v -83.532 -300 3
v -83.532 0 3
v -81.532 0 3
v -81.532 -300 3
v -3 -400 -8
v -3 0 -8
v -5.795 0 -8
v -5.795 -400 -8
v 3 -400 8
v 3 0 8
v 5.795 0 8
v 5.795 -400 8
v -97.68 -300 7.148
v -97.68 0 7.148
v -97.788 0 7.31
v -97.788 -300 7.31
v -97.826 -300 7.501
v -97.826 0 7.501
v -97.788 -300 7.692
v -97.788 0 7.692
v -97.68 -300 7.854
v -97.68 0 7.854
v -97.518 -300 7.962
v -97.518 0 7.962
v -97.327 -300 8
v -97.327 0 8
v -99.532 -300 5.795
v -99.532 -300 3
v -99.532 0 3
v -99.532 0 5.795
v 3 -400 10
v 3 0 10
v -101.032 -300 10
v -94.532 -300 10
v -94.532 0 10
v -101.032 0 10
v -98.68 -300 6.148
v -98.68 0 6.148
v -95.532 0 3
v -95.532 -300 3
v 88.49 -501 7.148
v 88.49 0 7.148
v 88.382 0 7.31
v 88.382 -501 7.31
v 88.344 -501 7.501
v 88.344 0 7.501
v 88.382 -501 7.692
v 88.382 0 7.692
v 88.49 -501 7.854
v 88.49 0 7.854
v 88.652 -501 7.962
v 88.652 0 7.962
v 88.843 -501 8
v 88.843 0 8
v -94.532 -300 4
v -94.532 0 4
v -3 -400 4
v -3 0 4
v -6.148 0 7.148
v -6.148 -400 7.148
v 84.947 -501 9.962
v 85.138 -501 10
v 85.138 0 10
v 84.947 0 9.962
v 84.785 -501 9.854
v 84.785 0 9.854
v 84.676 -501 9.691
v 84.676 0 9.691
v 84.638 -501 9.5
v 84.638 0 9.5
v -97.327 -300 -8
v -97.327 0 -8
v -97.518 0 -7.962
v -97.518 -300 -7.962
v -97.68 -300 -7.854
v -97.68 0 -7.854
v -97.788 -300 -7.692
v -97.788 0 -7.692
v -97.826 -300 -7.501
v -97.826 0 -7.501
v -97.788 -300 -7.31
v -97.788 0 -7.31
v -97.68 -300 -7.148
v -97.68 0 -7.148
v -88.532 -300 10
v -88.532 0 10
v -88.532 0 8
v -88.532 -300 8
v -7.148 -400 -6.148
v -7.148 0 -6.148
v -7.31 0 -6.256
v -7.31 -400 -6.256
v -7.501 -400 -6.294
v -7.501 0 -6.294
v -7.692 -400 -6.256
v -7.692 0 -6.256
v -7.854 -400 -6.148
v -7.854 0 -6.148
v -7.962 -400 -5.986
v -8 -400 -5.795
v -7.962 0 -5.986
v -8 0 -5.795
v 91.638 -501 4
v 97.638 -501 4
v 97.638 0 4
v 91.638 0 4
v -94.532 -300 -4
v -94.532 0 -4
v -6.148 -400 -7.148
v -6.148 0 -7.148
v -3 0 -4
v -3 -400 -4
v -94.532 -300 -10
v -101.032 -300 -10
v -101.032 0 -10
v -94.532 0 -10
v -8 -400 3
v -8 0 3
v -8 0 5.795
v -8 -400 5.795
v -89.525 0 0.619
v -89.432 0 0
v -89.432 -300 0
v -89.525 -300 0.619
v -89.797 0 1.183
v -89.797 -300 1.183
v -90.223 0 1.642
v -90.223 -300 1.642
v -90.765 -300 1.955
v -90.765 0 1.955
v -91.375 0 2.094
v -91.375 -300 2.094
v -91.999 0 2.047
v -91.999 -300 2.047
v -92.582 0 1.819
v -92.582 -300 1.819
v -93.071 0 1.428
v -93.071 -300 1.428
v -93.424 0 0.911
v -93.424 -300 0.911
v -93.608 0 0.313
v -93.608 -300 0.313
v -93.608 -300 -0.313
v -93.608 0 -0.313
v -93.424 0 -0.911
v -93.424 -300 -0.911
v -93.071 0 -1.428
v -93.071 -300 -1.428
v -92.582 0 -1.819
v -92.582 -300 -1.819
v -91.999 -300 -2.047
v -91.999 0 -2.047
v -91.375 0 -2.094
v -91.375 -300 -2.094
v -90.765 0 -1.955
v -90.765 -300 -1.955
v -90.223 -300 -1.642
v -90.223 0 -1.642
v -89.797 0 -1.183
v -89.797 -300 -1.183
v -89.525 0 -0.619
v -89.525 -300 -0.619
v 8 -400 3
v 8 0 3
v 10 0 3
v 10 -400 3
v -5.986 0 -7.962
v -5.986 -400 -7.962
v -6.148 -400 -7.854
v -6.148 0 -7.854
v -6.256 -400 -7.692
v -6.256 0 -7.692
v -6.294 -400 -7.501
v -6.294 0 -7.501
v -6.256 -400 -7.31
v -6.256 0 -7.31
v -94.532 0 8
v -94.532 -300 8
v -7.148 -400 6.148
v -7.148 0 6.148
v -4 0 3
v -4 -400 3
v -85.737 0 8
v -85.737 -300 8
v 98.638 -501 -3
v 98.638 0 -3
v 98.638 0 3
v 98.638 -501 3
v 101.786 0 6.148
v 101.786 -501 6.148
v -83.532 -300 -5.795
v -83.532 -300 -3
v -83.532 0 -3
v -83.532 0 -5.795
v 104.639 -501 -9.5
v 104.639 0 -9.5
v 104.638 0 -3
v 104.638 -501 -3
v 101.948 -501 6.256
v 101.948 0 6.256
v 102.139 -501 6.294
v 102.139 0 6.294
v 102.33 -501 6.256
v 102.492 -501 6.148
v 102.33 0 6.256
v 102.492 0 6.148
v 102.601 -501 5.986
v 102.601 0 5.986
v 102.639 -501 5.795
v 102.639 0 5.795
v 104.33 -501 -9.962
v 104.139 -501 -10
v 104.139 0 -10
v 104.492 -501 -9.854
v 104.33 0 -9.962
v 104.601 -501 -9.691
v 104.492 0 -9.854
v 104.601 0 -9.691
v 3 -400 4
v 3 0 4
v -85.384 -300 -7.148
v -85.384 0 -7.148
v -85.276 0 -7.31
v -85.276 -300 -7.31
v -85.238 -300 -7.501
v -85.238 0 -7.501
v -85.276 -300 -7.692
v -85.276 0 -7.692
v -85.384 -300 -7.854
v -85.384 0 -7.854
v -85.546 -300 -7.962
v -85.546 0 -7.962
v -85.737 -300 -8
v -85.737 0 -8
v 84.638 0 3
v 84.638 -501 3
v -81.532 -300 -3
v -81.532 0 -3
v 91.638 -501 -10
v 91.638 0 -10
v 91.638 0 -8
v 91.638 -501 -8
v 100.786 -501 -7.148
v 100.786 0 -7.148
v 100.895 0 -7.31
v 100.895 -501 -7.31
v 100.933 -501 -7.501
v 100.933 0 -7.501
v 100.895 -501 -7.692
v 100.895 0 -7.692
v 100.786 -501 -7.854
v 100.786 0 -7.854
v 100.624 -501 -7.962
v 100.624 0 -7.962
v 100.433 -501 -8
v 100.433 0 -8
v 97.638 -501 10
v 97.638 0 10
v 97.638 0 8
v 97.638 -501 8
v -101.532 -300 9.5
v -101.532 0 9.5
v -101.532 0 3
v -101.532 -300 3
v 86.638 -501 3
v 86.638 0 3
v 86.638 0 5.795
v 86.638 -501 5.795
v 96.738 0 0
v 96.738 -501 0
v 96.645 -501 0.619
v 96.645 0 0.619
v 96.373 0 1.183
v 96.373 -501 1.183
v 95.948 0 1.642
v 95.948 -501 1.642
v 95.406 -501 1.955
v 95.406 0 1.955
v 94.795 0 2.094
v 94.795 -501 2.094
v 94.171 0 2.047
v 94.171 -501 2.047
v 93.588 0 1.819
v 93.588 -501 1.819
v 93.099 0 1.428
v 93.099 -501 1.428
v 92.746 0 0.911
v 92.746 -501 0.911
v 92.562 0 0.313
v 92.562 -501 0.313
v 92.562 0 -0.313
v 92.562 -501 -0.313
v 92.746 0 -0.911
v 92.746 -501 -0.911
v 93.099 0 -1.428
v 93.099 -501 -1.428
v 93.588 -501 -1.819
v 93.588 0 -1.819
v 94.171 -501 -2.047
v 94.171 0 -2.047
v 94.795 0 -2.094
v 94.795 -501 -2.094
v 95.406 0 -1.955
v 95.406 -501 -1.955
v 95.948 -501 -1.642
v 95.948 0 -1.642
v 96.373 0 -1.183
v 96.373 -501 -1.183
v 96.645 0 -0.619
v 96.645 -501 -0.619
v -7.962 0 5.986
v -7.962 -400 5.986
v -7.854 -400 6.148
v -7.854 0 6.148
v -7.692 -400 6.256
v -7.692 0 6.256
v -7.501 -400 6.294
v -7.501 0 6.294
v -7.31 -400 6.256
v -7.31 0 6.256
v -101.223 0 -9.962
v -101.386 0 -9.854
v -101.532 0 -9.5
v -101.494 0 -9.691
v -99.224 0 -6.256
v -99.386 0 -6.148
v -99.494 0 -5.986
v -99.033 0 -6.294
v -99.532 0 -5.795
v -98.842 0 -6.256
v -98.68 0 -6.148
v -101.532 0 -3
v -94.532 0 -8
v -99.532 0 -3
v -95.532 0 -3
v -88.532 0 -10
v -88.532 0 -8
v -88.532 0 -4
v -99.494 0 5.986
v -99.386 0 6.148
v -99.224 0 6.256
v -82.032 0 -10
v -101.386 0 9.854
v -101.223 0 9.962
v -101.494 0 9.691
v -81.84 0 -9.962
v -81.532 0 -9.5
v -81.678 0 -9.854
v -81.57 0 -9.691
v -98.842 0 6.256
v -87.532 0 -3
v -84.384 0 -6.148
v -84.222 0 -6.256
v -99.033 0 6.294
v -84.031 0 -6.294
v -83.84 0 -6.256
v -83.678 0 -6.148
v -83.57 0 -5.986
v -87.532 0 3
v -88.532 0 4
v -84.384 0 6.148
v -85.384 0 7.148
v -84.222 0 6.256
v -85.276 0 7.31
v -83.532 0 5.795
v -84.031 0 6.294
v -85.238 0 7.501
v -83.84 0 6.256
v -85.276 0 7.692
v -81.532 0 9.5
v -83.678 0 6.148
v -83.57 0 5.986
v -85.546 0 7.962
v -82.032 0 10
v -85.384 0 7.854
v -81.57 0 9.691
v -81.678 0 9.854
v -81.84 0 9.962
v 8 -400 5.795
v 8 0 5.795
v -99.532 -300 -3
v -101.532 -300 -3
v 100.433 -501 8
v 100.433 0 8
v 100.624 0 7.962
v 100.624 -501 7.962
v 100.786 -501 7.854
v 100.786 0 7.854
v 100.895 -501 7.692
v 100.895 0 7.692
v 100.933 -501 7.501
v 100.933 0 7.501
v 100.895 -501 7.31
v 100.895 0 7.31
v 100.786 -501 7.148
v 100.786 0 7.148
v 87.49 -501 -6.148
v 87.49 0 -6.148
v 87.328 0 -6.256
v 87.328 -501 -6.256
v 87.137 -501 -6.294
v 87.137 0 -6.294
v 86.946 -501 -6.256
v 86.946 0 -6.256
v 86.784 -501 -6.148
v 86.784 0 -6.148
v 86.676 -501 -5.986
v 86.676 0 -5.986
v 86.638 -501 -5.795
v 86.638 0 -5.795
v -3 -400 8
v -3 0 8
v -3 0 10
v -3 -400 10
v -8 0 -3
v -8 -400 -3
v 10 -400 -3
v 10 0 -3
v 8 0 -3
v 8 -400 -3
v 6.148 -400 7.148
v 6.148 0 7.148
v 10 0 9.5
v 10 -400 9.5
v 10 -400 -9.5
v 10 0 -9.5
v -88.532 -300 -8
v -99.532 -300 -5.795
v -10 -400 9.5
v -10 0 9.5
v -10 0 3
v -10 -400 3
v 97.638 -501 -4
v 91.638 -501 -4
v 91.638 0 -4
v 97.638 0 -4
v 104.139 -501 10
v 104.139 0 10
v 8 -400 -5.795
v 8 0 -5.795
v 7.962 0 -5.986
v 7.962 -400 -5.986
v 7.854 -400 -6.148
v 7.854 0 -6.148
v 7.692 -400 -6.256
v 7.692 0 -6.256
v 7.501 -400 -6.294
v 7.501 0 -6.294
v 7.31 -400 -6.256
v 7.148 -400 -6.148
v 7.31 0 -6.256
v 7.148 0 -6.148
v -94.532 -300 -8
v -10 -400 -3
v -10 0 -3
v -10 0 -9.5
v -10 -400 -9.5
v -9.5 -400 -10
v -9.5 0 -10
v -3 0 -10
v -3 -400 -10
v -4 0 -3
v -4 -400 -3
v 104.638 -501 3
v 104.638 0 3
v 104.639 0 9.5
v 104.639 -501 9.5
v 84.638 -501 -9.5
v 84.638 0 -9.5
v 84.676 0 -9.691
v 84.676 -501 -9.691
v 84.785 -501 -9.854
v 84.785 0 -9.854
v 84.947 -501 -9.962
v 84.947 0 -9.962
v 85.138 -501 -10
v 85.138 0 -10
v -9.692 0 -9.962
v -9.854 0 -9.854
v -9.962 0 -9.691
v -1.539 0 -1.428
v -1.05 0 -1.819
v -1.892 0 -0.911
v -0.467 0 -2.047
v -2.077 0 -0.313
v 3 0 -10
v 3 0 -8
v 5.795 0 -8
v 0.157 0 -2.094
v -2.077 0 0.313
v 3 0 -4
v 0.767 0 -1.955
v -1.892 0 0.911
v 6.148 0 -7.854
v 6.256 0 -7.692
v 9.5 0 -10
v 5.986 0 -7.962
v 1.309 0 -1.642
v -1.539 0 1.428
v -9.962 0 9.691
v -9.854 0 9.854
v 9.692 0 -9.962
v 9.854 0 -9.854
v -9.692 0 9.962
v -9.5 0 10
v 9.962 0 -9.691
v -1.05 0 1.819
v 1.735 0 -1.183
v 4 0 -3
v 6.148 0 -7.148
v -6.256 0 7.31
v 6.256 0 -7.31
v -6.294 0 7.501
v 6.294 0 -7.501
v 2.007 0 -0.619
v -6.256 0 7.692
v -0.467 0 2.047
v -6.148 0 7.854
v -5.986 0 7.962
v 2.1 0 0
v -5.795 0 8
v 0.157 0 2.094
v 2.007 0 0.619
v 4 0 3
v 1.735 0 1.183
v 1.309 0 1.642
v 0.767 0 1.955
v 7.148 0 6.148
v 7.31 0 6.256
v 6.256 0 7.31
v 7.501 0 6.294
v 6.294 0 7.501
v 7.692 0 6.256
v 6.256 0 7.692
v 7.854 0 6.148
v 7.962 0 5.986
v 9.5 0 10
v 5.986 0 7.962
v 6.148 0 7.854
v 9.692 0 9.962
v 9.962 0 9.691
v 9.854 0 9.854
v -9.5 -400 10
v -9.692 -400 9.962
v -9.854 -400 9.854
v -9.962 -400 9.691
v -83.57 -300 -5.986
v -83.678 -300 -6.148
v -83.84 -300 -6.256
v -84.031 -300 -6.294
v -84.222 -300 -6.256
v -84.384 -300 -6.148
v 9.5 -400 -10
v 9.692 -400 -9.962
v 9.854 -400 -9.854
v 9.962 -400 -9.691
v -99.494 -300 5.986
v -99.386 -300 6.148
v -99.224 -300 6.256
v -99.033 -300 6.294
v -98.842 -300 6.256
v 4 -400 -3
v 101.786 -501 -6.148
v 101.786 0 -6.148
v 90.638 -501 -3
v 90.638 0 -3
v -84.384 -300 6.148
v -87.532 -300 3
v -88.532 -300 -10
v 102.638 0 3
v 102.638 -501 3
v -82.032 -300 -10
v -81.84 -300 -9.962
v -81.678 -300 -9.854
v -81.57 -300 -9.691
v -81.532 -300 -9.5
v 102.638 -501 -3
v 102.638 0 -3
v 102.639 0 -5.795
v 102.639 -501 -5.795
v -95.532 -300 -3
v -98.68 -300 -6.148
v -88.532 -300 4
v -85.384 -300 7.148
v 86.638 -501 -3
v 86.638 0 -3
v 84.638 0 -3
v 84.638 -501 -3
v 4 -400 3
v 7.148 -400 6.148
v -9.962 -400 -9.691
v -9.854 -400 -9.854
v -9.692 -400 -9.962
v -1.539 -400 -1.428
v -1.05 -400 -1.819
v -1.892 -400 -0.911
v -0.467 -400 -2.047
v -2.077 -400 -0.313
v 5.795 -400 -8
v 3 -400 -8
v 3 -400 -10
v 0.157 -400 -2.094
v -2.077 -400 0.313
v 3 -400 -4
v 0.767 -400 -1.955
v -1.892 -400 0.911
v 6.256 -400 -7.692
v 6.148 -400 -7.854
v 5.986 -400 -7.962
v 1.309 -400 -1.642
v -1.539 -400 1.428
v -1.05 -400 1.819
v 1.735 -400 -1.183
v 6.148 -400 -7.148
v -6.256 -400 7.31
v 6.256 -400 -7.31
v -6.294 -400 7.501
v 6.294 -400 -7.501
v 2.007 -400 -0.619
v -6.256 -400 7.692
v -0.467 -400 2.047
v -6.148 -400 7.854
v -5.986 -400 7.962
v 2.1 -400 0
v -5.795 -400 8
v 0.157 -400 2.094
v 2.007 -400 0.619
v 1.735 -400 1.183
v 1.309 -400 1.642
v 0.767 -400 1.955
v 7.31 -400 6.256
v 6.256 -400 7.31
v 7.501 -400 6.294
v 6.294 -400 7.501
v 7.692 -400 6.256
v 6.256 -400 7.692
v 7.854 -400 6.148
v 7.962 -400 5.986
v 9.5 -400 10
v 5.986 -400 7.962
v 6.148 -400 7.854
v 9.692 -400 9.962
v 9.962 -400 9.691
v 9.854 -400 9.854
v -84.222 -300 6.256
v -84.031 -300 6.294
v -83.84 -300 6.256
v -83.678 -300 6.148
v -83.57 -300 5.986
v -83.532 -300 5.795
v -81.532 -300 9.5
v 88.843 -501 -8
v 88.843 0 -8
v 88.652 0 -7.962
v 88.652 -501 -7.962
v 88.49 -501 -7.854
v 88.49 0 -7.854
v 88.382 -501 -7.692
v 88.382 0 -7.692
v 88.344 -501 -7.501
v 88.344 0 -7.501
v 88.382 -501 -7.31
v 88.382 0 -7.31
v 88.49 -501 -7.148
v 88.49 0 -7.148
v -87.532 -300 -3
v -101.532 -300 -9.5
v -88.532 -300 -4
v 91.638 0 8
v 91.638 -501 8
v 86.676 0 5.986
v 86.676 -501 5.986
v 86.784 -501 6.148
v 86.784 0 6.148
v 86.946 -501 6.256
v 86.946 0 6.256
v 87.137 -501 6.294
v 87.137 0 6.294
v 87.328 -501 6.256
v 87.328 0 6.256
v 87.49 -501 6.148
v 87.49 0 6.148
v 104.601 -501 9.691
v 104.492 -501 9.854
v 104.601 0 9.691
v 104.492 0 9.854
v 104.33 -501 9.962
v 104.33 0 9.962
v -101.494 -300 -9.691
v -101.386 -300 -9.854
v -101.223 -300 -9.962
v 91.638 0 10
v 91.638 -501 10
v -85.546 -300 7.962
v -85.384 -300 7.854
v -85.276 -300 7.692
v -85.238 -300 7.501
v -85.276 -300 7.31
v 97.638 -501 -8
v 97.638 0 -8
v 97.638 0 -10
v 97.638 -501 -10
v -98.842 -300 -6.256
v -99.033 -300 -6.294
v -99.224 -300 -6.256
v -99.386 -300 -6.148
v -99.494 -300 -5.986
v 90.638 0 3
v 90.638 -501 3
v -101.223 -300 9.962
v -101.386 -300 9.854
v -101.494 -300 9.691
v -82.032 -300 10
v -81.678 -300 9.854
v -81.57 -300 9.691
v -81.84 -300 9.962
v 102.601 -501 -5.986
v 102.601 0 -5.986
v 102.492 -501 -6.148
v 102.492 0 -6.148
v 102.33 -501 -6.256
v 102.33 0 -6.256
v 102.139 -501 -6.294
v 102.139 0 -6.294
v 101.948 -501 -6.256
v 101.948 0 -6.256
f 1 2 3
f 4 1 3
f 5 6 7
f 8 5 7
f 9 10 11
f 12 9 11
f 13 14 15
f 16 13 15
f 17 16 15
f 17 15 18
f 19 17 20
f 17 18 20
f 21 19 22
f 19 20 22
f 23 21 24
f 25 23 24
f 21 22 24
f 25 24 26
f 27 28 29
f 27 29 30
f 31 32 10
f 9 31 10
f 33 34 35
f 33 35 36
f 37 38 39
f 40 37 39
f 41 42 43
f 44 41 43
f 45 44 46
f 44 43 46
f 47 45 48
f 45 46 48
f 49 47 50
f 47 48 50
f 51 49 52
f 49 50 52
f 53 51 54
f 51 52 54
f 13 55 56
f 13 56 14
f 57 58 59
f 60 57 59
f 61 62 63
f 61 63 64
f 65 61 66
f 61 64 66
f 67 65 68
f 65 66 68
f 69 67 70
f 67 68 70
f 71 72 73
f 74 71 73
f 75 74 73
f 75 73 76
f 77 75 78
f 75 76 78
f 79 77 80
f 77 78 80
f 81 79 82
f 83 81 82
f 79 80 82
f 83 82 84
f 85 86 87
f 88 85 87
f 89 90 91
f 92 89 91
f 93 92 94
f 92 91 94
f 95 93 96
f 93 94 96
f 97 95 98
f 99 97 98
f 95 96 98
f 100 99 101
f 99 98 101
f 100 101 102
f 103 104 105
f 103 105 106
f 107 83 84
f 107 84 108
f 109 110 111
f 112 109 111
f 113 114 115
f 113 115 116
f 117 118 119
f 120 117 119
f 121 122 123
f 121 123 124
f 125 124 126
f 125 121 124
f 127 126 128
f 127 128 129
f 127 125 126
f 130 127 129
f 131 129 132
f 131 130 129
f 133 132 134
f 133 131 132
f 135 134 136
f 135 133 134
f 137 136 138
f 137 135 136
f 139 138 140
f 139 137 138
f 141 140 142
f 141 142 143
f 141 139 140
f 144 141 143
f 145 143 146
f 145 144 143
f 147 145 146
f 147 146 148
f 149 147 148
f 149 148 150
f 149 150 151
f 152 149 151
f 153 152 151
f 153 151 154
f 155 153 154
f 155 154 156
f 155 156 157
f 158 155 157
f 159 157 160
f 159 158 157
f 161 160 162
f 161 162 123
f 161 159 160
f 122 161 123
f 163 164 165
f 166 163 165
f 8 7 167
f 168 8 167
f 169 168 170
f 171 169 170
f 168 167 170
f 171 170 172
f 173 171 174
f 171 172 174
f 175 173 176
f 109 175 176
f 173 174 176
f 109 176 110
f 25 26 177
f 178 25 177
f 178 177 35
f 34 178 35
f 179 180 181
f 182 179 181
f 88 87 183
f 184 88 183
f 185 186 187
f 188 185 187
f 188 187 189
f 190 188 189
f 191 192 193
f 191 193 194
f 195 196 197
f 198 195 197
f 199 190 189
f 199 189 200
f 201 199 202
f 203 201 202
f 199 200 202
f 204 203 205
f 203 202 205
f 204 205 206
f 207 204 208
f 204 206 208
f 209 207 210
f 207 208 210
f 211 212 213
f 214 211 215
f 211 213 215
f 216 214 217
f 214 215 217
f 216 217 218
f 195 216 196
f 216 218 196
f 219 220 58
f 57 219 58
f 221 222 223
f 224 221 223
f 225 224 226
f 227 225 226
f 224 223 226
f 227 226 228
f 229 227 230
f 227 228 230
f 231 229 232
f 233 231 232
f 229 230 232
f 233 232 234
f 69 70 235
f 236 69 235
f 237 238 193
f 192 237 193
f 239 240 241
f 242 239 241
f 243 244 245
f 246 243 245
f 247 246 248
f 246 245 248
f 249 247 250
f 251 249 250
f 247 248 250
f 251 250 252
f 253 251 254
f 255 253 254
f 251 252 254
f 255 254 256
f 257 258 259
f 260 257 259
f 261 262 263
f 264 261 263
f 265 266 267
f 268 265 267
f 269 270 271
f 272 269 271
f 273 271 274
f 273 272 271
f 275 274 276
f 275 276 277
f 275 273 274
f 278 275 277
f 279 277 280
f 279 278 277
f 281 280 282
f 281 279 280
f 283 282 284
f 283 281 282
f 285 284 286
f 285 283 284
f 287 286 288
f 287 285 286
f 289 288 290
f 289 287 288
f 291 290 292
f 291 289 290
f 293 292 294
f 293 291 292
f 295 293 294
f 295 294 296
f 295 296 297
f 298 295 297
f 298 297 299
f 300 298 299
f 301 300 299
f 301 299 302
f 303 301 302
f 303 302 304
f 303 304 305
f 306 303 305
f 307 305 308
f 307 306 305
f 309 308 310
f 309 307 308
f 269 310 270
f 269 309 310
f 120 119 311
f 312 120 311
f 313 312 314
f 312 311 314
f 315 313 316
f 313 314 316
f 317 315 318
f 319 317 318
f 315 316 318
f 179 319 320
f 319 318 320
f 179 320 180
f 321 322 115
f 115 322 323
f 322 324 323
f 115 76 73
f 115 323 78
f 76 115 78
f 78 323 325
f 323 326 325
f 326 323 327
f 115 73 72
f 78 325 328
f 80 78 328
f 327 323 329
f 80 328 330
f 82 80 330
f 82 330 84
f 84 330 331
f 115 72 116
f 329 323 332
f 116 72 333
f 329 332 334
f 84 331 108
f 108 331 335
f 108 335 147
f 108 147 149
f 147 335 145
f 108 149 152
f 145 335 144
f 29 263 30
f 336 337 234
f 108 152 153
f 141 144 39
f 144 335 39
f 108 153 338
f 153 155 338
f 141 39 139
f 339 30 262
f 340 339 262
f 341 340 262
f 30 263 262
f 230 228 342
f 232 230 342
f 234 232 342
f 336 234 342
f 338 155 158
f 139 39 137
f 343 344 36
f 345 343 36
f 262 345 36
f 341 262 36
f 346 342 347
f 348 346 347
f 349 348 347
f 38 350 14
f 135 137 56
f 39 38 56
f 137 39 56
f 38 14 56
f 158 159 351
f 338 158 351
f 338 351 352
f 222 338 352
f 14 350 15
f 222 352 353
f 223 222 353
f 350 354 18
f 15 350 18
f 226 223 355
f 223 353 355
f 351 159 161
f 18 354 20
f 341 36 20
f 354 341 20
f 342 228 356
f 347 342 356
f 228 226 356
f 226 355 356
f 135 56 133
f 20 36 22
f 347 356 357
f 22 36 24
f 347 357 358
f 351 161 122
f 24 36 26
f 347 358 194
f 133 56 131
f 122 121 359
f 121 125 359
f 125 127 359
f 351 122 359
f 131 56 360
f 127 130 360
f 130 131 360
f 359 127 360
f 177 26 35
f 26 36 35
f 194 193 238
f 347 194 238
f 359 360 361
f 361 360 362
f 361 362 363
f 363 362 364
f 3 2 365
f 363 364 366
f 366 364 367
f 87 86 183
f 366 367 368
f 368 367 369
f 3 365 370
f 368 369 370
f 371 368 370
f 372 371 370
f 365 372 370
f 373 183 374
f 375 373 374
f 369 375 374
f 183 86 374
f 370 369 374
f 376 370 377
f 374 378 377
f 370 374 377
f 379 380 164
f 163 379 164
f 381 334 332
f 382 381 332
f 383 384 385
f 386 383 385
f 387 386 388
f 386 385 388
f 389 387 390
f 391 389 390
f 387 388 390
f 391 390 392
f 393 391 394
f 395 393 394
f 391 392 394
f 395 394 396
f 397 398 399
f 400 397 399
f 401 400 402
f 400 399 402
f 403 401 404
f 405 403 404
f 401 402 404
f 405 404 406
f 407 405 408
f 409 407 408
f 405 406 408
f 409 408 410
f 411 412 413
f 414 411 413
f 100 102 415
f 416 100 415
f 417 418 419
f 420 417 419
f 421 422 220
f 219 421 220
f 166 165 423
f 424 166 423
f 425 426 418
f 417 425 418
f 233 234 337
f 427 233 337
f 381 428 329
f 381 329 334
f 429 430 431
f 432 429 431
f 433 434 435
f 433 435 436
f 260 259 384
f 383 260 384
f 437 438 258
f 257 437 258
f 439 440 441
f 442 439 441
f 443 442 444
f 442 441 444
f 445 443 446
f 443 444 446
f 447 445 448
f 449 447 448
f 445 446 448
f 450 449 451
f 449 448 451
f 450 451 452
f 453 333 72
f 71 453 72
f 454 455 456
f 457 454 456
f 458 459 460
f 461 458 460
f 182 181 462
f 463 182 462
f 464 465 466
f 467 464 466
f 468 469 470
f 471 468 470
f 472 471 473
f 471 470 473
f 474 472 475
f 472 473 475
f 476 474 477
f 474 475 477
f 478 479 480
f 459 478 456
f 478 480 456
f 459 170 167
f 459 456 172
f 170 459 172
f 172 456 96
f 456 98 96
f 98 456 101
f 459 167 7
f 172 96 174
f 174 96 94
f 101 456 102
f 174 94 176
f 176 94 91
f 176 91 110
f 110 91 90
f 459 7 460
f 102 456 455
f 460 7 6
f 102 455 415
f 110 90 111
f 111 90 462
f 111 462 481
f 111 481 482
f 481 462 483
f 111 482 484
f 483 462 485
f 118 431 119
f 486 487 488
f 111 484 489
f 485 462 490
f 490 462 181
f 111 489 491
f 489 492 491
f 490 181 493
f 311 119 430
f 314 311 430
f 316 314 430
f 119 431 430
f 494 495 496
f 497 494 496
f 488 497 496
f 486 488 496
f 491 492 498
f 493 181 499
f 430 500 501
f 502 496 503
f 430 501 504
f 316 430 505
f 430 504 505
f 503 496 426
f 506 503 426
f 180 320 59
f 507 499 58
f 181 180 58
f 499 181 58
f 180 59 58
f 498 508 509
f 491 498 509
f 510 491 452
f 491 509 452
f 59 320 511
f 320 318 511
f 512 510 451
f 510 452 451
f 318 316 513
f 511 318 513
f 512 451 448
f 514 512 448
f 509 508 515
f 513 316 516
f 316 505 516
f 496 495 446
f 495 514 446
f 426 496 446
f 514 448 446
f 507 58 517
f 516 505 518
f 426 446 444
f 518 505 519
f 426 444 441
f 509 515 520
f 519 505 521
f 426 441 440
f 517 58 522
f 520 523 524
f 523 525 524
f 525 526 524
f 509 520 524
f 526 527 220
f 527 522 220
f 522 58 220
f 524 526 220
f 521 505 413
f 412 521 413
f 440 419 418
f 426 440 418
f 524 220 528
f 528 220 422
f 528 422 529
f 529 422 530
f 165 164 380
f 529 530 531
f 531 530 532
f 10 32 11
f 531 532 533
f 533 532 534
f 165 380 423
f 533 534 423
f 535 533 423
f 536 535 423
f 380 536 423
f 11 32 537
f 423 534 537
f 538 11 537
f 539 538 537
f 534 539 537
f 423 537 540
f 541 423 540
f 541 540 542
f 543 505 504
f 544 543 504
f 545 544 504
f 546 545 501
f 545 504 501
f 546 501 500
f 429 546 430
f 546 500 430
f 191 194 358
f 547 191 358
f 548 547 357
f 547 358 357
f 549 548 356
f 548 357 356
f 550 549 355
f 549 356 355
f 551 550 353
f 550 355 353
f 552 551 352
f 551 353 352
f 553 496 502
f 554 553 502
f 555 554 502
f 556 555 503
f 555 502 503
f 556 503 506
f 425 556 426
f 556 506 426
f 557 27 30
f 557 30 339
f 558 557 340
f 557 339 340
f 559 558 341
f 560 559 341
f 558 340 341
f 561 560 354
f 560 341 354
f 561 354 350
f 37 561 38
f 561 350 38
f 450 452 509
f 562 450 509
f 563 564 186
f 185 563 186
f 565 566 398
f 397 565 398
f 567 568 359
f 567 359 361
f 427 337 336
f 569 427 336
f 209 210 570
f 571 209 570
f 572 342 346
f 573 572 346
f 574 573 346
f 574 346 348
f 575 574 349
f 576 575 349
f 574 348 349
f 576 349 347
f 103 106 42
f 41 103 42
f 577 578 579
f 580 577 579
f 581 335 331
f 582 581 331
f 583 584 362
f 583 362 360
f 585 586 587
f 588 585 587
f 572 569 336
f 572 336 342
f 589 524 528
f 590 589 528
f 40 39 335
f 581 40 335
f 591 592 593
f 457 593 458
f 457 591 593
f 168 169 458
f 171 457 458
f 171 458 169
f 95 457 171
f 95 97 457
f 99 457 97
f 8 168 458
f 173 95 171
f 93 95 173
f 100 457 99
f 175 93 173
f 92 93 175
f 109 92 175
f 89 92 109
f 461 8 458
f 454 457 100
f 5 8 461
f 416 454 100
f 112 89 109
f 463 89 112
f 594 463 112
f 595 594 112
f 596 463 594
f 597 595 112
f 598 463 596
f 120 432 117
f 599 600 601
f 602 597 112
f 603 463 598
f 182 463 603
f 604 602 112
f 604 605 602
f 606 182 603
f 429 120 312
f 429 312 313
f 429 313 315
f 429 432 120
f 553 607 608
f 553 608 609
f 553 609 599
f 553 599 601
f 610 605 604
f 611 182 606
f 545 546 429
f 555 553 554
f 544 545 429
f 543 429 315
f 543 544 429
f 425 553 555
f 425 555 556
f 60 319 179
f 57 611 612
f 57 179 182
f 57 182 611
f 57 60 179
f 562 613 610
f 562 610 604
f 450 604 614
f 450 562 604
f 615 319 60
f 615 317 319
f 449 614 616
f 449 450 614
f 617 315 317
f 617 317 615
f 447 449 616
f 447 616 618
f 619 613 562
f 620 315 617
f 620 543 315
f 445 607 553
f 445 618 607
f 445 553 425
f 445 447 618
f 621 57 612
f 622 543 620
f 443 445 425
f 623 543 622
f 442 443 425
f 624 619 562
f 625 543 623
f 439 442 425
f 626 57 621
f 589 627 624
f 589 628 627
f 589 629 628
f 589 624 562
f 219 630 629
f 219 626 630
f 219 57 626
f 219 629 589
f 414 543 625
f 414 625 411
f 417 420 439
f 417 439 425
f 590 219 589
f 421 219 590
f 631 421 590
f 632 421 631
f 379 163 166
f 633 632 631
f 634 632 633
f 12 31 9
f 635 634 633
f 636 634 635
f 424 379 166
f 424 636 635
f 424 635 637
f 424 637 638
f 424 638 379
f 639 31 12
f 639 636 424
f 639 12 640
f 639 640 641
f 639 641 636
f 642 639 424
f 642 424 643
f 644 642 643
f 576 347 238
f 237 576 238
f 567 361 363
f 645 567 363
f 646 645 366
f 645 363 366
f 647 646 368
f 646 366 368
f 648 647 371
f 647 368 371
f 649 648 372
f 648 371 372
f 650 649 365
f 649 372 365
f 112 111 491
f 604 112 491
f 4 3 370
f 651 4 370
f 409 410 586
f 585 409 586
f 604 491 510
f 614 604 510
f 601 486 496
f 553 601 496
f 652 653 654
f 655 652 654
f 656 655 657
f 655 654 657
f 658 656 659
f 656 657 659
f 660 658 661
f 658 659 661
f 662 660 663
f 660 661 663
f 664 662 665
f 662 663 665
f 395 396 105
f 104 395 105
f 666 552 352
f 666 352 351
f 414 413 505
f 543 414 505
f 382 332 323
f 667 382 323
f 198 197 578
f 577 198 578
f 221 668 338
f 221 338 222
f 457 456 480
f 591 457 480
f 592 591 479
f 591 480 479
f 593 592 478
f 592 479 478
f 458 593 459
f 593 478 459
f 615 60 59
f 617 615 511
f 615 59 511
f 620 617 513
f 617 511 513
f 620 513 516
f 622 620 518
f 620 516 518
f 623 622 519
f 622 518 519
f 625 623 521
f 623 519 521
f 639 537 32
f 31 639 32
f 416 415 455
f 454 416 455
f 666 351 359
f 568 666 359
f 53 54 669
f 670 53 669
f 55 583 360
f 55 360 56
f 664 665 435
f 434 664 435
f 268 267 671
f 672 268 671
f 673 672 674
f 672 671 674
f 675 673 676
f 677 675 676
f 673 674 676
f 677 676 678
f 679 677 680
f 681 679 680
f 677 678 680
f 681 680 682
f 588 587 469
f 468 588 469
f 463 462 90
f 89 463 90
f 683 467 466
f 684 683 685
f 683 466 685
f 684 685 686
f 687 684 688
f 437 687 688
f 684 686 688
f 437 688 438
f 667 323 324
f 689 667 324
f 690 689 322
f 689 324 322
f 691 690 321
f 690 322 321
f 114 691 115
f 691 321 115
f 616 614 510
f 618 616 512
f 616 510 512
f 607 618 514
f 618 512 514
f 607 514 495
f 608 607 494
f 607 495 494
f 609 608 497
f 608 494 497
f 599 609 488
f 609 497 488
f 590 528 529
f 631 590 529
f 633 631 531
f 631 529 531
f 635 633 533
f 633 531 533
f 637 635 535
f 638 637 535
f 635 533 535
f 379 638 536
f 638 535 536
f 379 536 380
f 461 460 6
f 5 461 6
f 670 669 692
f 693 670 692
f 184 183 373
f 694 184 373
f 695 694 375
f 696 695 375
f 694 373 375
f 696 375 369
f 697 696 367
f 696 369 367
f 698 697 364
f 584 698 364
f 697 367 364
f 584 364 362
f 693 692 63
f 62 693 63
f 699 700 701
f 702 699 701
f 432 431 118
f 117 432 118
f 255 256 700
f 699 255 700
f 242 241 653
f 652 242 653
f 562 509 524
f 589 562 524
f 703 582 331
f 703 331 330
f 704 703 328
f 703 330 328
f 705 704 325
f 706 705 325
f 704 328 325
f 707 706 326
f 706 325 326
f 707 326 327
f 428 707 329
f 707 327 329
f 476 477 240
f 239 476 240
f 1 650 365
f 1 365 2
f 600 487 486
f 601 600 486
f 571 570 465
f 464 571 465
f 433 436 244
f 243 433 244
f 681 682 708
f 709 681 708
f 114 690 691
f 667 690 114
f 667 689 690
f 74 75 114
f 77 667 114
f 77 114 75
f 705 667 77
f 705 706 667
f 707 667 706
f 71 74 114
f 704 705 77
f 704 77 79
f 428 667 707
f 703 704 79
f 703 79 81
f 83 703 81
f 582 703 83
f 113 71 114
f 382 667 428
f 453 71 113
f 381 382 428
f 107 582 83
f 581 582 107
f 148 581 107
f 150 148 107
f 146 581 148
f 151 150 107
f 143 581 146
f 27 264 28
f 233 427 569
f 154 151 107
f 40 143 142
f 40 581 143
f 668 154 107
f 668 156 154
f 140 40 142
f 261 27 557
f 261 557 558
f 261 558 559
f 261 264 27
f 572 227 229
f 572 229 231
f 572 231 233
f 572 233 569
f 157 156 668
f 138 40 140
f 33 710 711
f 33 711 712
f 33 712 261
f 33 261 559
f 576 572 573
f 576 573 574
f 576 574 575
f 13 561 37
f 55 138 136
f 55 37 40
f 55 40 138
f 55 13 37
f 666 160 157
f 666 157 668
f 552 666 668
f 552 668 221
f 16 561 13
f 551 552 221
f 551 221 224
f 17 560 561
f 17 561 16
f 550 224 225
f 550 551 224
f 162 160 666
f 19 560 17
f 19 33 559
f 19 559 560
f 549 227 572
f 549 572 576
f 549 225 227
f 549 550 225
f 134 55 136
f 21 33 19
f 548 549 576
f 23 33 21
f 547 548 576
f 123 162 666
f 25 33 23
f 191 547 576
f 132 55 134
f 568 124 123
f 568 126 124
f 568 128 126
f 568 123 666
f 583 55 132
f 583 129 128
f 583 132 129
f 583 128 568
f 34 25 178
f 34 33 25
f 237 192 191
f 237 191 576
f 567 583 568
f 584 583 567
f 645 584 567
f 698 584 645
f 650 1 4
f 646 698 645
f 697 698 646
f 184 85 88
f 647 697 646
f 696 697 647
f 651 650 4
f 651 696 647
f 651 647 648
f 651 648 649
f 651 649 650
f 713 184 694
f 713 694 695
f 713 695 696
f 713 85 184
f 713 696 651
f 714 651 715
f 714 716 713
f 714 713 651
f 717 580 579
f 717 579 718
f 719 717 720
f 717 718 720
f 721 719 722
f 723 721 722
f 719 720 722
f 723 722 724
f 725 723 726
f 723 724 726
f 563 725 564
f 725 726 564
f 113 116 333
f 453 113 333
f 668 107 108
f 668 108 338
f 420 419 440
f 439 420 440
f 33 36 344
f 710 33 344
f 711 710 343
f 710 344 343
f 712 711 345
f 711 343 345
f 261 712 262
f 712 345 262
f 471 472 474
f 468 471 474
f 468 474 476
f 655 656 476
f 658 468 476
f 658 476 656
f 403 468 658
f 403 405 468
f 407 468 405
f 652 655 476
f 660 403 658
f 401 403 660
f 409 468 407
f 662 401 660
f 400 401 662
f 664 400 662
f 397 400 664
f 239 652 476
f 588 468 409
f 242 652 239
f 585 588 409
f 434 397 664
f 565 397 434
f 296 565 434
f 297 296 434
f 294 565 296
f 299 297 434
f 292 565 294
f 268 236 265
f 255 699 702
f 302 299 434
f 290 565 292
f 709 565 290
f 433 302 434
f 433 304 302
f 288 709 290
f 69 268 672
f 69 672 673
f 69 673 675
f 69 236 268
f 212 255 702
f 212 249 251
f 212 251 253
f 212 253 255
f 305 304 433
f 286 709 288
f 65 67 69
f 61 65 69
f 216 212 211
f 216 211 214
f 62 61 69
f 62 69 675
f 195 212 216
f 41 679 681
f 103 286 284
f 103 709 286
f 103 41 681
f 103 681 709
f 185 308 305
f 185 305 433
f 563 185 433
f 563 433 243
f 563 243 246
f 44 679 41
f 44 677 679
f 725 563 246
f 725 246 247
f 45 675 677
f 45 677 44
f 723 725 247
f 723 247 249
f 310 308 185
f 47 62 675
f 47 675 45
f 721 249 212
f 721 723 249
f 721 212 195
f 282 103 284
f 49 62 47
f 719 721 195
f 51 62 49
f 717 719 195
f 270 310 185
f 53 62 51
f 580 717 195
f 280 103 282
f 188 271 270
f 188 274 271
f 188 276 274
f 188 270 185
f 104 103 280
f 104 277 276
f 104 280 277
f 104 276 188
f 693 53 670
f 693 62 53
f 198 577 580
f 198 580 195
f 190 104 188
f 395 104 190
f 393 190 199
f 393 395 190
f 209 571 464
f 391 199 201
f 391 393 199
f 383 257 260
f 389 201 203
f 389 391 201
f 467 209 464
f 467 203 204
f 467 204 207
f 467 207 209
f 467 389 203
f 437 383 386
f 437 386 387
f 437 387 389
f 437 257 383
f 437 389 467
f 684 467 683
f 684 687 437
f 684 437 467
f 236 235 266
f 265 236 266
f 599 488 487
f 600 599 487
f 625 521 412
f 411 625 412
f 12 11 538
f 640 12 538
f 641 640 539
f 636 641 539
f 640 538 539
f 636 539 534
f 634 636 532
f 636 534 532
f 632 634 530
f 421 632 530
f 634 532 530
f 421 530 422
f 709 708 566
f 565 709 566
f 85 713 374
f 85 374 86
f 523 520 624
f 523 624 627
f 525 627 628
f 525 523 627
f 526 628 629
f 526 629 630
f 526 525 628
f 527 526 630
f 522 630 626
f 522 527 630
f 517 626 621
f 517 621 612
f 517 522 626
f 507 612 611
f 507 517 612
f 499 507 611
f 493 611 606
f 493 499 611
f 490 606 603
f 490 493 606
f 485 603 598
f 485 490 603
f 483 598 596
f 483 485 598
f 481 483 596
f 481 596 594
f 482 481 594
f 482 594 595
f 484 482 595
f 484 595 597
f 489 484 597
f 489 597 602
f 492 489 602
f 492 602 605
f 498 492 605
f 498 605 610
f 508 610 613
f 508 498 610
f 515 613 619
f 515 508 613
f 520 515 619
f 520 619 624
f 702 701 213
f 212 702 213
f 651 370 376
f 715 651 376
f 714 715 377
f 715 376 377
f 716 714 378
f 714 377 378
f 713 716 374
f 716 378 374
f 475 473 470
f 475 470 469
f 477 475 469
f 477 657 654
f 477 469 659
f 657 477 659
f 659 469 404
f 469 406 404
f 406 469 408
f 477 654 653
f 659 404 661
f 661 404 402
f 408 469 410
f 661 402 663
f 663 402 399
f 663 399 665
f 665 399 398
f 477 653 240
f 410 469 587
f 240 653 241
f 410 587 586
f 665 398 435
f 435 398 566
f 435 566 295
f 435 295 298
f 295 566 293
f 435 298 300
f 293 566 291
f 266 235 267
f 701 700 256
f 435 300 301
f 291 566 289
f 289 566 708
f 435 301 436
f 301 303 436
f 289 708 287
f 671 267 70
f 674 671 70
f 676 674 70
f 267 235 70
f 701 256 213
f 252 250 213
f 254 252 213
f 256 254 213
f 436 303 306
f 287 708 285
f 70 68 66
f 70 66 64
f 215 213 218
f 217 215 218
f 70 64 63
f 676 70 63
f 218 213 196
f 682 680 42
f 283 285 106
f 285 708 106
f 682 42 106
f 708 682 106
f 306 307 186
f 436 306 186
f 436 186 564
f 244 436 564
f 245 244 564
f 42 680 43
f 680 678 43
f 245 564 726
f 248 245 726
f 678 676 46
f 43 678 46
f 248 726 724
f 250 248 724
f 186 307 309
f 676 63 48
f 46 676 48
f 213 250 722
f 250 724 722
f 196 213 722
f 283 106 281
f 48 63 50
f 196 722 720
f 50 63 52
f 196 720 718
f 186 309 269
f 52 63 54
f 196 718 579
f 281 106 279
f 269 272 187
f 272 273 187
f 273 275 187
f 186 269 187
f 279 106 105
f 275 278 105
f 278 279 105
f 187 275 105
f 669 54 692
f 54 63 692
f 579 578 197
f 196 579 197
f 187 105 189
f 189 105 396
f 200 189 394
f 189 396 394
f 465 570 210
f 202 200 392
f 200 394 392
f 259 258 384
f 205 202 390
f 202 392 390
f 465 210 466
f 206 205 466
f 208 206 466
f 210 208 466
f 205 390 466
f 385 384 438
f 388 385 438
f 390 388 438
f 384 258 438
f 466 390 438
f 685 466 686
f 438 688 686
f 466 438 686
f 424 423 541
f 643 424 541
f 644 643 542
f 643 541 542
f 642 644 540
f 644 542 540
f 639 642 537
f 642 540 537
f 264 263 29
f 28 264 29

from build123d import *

# Parameters (mm, degrees)
F0_R     = 2.1
F1_DEPTH = 400
F2_DEPTH = 300
F3_DEPTH = 501


# Not quite as in the source:
# - ends of sketch curves that miss each other by under 0.0002 mm in the source are joined


with BuildPart() as f1:
    # F0 (on Front) → F1 (new body)
    with BuildSketch(Plane.XZ):
        with BuildLine():
            Line((-2.9999018588, 10), (-9.5002061197, 10))
            ThreePointArc((-9.5002061197, 10), (-9.8537595103, 9.8535533906), (-10.0002061197, 9.5))
            Line((-10.0002061197, 9.5), (-10.0000650851, 2.9996848913))
            Line((-10.0000650851, 2.9996848913), (-8.0000650797, 2.9997609984))
            Line((-8.0000650797, 2.9997609984), (-8.0001257238, 5.7948624374))
            ThreePointArc((-8.0001257238, 5.7948624374), (-7.6920243598, 6.2559885353), (-7.1480945067, 6.147803307))
            Line((-7.1480945067, 6.147803307), (-4.0000487303, 2.9998477851))
            Line((-4.0000487303, 2.9998477851), (-4.0000487303, -2.9998477851))
            Line((-4.0000487303, -2.9998477851), (-7.1480945067, -6.147803307))
            ThreePointArc((-7.1480945067, -6.147803307), (-7.6920243598, -6.2559885353), (-8.0001257238, -5.7948624374))
            Line((-8.0001257238, -5.7948624374), (-8.0000650797, -2.9997609984))
            Line((-8.0000650797, -2.9997609984), (-10.0000650851, -2.9996848913))
            Line((-10.0000650851, -2.9996848913), (-10.0002061194, -9.4999891517))
            ThreePointArc((-10.0002061194, -9.4999891517), (-9.8537595103, -9.8535533906), (-9.5002061197, -10))
            Line((-9.5002061197, -10), (-2.9999018588, -10))
            Line((-2.9999018588, -10), (-2.9999345728, -7.9999999934))
            Line((-2.9999345728, -7.9999999934), (-5.7950360114, -7.9999999934))
            ThreePointArc((-5.7950360114, -7.9999999934), (-6.2561554244, -7.6918886246), (-6.1479583947, -7.1479611189))
            Line((-6.1479583947, -7.1479611189), (-2.9999345717, -3.9999836431))
            Line((-2.9999345717, -3.9999836431), (2.9999345717, -3.9999836431))
            Line((2.9999345717, -3.9999836431), (6.1479583947, -7.1479611189))
            ThreePointArc((6.1479583947, -7.1479611189), (6.2561554244, -7.6918886246), (5.7950360114, -7.9999999934))
            Line((5.7950360114, -7.9999999934), (2.9999345728, -7.9999999934))
            Line((2.9999345728, -7.9999999934), (2.9999018588, -10))
            Line((2.9999018588, -10), (9.5002061197, -10))
            ThreePointArc((9.5002061197, -10), (9.8537595103, -9.8535533906), (10.0002061197, -9.5))
            Line((10.0002061197, -9.5), (10.0000650851, -2.9996848913))
            Line((10.0000650851, -2.9996848913), (8.0000650797, -2.9997609984))
            Line((8.0000650797, -2.9997609984), (8.0001257238, -5.7948624374))
            ThreePointArc((8.0001257238, -5.7948624374), (7.6920243598, -6.2559885353), (7.1480945067, -6.147803307))
            Line((7.1480945067, -6.147803307), (4.0000487303, -2.9998477851))
            Line((4.0000487303, -2.9998477851), (4.0000487303, 2.9998477851))
            Line((4.0000487303, 2.9998477851), (7.1480945067, 6.147803307))
            ThreePointArc((7.1480945067, 6.147803307), (7.6920243598, 6.2559885353), (8.0001257238, 5.7948624374))
            Line((8.0001257238, 5.7948624374), (8.0000650797, 2.9997609984))
            Line((8.0000650797, 2.9997609984), (10.0000650851, 2.9996848913))
            Line((10.0000650851, 2.9996848913), (10.0002061194, 9.4999891517))
            ThreePointArc((10.0002061194, 9.4999891517), (9.8537595103, 9.8535533906), (9.5002061197, 10))
            Line((9.5002061197, 10), (2.9999018588, 10))
            Line((2.9999018588, 10), (2.9999345728, 7.9999999934))
            Line((2.9999345728, 7.9999999934), (5.7950360114, 7.9999999934))
            ThreePointArc((5.7950360114, 7.9999999934), (6.2561554244, 7.6918886246), (6.1479583947, 7.1479611189))
            Line((6.1479583947, 7.1479611189), (2.9999345717, 3.9999836431))
            Line((2.9999345717, 3.9999836431), (-2.9999345717, 3.9999836431))
            Line((-2.9999345717, 3.9999836431), (-6.1479583947, 7.1479611189))
            ThreePointArc((-6.1479583947, 7.1479611189), (-6.2561554244, 7.6918886246), (-5.7950360114, 7.9999999934))
            Line((-5.7950360114, 7.9999999934), (-2.9999345728, 7.9999999934))
            Line((-2.9999345728, 7.9999999934), (-2.9999018588, 10))
        make_face()
        Circle(F0_R, mode=Mode.SUBTRACT)
    extrude(amount=F1_DEPTH)


with BuildPart() as f2:
    # F0 (on Front) → F2 (new body)
    with BuildSketch(Plane.XZ):
        with BuildLine():
            Line((-83.5317097726, 5.7948624374), (-83.5317704167, 2.9997609984))
            Line((-83.5317704167, 2.9997609984), (-81.5317704113, 2.9996848913))
            Line((-81.5317704113, 2.9996848913), (-81.531629377, 9.4999891517))
            ThreePointArc((-81.531629377, 9.4999891517), (-81.6780759861, 9.8535533906), (-82.0316293767, 10))
            Line((-82.0316293767, 10), (-88.5319336376, 10))
            Line((-88.5319336376, 10), (-88.5319009236, 7.9999999934))
            Line((-88.5319009236, 7.9999999934), (-85.736799485, 7.9999999934))
            ThreePointArc((-85.736799485, 7.9999999934), (-85.275680072, 7.6918886246), (-85.3838771017, 7.1479611189))
            Line((-85.3838771017, 7.1479611189), (-88.5319009247, 3.9999836431))
            Line((-88.5319009247, 3.9999836431), (-94.5317700681, 3.9999836431))
            Line((-94.5317700681, 3.9999836431), (-97.6797938911, 7.1479611189))
            ThreePointArc((-97.6797938911, 7.1479611189), (-97.7879909208, 7.6918886246), (-97.3268715078, 7.9999999934))
            Line((-97.3268715078, 7.9999999934), (-94.5317700692, 7.9999999934))
            Line((-94.5317700692, 7.9999999934), (-94.5317373552, 10))
            Line((-94.5317373552, 10), (-101.0320416161, 10))
            ThreePointArc((-101.0320416161, 10), (-101.3855950067, 9.8535533906), (-101.5320416161, 9.5))
            Line((-101.5320416161, 9.5), (-101.5319005815, 2.9996848913))
            Line((-101.5319005815, 2.9996848913), (-99.5319005761, 2.9997609984))
            Line((-99.5319005761, 2.9997609984), (-99.5319612202, 5.7948624374))
            ThreePointArc((-99.5319612202, 5.7948624374), (-99.2238598562, 6.2559885353), (-98.6799300032, 6.147803307))
            Line((-98.6799300032, 6.147803307), (-95.5318842267, 2.9998477851))
            Line((-95.5318842267, 2.9998477851), (-95.5318842267, -2.9998477851))
            Line((-95.5318842267, -2.9998477851), (-98.6799300032, -6.147803307))
            ThreePointArc((-98.6799300032, -6.147803307), (-99.2238598562, -6.2559885353), (-99.5319612202, -5.7948624374))
            Line((-99.5319612202, -5.7948624374), (-99.5319005761, -2.9997609984))
            Line((-99.5319005761, -2.9997609984), (-101.5319005815, -2.9996848913))
            Line((-101.5319005815, -2.9996848913), (-101.5320416159, -9.4999891517))
            ThreePointArc((-101.5320416159, -9.4999891517), (-101.3855950067, -9.8535533906), (-101.0320416161, -10))
            Line((-101.0320416161, -10), (-94.5317373552, -10))
            Line((-94.5317373552, -10), (-94.5317700692, -7.9999999934))
            Line((-94.5317700692, -7.9999999934), (-97.3268715078, -7.9999999934))
            ThreePointArc((-97.3268715078, -7.9999999934), (-97.7879909208, -7.6918886246), (-97.6797938911, -7.1479611189))
            Line((-97.6797938911, -7.1479611189), (-94.5317700681, -3.9999836431))
            Line((-94.5317700681, -3.9999836431), (-88.5319009247, -3.9999836431))
            Line((-88.5319009247, -3.9999836431), (-85.3838771017, -7.1479611189))
            ThreePointArc((-85.3838771017, -7.1479611189), (-85.275680072, -7.6918886246), (-85.736799485, -7.9999999934))
            Line((-85.736799485, -7.9999999934), (-88.5319009236, -7.9999999934))
            Line((-88.5319009236, -7.9999999934), (-88.5319336376, -10))
            Line((-88.5319336376, -10), (-82.0316293767, -10))
            ThreePointArc((-82.0316293767, -10), (-81.6780759861, -9.8535533906), (-81.5316293767, -9.5))
            Line((-81.5316293767, -9.5), (-81.5317704113, -2.9996848913))
            Line((-81.5317704113, -2.9996848913), (-83.5317704167, -2.9997609984))
            Line((-83.5317704167, -2.9997609984), (-83.5317097726, -5.7948624374))
            ThreePointArc((-83.5317097726, -5.7948624374), (-83.8398111366, -6.2559885353), (-84.3837409897, -6.147803307))
            Line((-84.3837409897, -6.147803307), (-87.5317867661, -2.9998477851))
            Line((-87.5317867661, -2.9998477851), (-87.5317867661, 2.9998477851))
            Line((-87.5317867661, 2.9998477851), (-84.3837409897, 6.147803307))
            ThreePointArc((-84.3837409897, 6.147803307), (-83.8398111366, 6.2559885353), (-83.5317097726, 5.7948624374))
        make_face()
        with Locations((-91.5318354964, 0)):
            Circle(F0_R, mode=Mode.SUBTRACT)
    extrude(amount=F2_DEPTH)


with BuildPart() as f3:
    # F0 (on Front) → F3 (new body)
    with BuildSketch(Plane.XZ):
        with BuildLine():
            Line((100.43342089, -7.9999999934), (97.6383194514, -7.9999999934))
            Line((97.6383194514, -7.9999999934), (97.6382867374, -10))
            Line((97.6382867374, -10), (104.1385909983, -10))
            ThreePointArc((104.1385909983, -10), (104.4921443889, -9.8535533906), (104.6385909983, -9.5))
            Line((104.6385909983, -9.5), (104.6384499637, -2.9996848913))
            Line((104.6384499637, -2.9996848913), (102.6384499583, -2.9997609984))
            Line((102.6384499583, -2.9997609984), (102.6385106025, -5.7948624374))
            ThreePointArc((102.6385106025, -5.7948624374), (102.3304092384, -6.2559885353), (101.7864793854, -6.147803307))
            Line((101.7864793854, -6.147803307), (98.638433609, -2.9998477851))
            Line((98.638433609, -2.9998477851), (98.638433609, 2.9998477851))
            Line((98.638433609, 2.9998477851), (101.7864793854, 6.147803307))
            ThreePointArc((101.7864793854, 6.147803307), (102.3304092384, 6.2559885353), (102.6385106025, 5.7948624374))
            Line((102.6385106025, 5.7948624374), (102.6384499583, 2.9997609984))
            Line((102.6384499583, 2.9997609984), (104.6384499637, 2.9996848913))
            Line((104.6384499637, 2.9996848913), (104.6385909981, 9.4999891517))
            ThreePointArc((104.6385909981, 9.4999891517), (104.4921443889, 9.8535533906), (104.1385909983, 10))
            Line((104.1385909983, 10), (97.6382867374, 10))
            Line((97.6382867374, 10), (97.6383194514, 7.9999999934))
            Line((97.6383194514, 7.9999999934), (100.43342089, 7.9999999934))
            ThreePointArc((100.43342089, 7.9999999934), (100.894540303, 7.6918886246), (100.7863432733, 7.1479611189))
            Line((100.7863432733, 7.1479611189), (97.6383194504, 3.9999836431))
            Line((97.6383194504, 3.9999836431), (91.6384503069, 3.9999836431))
            Line((91.6384503069, 3.9999836431), (88.4904264839, 7.1479611189))
            ThreePointArc((88.4904264839, 7.1479611189), (88.3822294542, 7.6918886246), (88.8433488673, 7.9999999934))
            Line((88.8433488673, 7.9999999934), (91.6384503058, 7.9999999934))
            Line((91.6384503058, 7.9999999934), (91.6384830198, 10))
            Line((91.6384830198, 10), (85.1381787589, 10))
            ThreePointArc((85.1381787589, 10), (84.7846253684, 9.8535533906), (84.6381787589, 9.5))
            Line((84.6381787589, 9.5), (84.6383197935, 2.9996848913))
            Line((84.6383197935, 2.9996848913), (86.6383197989, 2.9997609984))
            Line((86.6383197989, 2.9997609984), (86.6382591548, 5.7948624374))
            ThreePointArc((86.6382591548, 5.7948624374), (86.9463605188, 6.2559885353), (87.4902903719, 6.147803307))
            Line((87.4902903719, 6.147803307), (90.6383361483, 2.9998477851))
            Line((90.6383361483, 2.9998477851), (90.6383361483, -2.9998477851))
            Line((90.6383361483, -2.9998477851), (87.4902903719, -6.147803307))
            ThreePointArc((87.4902903719, -6.147803307), (86.9463605188, -6.2559885353), (86.6382591548, -5.7948624374))
            Line((86.6382591548, -5.7948624374), (86.6383197989, -2.9997609984))
            Line((86.6383197989, -2.9997609984), (84.6383197935, -2.9996848913))
            Line((84.6383197935, -2.9996848913), (84.6381787592, -9.4999891517))
            ThreePointArc((84.6381787592, -9.4999891517), (84.7846253684, -9.8535533906), (85.1381787589, -10))
            Line((85.1381787589, -10), (91.6384830198, -10))
            Line((91.6384830198, -10), (91.6384503058, -7.9999999934))
            Line((91.6384503058, -7.9999999934), (88.8433488673, -7.9999999934))
            ThreePointArc((88.8433488673, -7.9999999934), (88.3822294542, -7.6918886246), (88.4904264839, -7.1479611189))
            Line((88.4904264839, -7.1479611189), (91.6384503069, -3.9999836431))
            Line((91.6384503069, -3.9999836431), (97.6383194504, -3.9999836431))
            Line((97.6383194504, -3.9999836431), (100.7863432733, -7.1479611189))
            ThreePointArc((100.7863432733, -7.1479611189), (100.894540303, -7.6918886246), (100.43342089, -7.9999999934))
        make_face()
        with Locations((94.6383848786, 0)):
            Circle(F0_R, mode=Mode.SUBTRACT)
    extrude(amount=F3_DEPTH)


solid = Compound([f1.part, f2.part, f3.part])
